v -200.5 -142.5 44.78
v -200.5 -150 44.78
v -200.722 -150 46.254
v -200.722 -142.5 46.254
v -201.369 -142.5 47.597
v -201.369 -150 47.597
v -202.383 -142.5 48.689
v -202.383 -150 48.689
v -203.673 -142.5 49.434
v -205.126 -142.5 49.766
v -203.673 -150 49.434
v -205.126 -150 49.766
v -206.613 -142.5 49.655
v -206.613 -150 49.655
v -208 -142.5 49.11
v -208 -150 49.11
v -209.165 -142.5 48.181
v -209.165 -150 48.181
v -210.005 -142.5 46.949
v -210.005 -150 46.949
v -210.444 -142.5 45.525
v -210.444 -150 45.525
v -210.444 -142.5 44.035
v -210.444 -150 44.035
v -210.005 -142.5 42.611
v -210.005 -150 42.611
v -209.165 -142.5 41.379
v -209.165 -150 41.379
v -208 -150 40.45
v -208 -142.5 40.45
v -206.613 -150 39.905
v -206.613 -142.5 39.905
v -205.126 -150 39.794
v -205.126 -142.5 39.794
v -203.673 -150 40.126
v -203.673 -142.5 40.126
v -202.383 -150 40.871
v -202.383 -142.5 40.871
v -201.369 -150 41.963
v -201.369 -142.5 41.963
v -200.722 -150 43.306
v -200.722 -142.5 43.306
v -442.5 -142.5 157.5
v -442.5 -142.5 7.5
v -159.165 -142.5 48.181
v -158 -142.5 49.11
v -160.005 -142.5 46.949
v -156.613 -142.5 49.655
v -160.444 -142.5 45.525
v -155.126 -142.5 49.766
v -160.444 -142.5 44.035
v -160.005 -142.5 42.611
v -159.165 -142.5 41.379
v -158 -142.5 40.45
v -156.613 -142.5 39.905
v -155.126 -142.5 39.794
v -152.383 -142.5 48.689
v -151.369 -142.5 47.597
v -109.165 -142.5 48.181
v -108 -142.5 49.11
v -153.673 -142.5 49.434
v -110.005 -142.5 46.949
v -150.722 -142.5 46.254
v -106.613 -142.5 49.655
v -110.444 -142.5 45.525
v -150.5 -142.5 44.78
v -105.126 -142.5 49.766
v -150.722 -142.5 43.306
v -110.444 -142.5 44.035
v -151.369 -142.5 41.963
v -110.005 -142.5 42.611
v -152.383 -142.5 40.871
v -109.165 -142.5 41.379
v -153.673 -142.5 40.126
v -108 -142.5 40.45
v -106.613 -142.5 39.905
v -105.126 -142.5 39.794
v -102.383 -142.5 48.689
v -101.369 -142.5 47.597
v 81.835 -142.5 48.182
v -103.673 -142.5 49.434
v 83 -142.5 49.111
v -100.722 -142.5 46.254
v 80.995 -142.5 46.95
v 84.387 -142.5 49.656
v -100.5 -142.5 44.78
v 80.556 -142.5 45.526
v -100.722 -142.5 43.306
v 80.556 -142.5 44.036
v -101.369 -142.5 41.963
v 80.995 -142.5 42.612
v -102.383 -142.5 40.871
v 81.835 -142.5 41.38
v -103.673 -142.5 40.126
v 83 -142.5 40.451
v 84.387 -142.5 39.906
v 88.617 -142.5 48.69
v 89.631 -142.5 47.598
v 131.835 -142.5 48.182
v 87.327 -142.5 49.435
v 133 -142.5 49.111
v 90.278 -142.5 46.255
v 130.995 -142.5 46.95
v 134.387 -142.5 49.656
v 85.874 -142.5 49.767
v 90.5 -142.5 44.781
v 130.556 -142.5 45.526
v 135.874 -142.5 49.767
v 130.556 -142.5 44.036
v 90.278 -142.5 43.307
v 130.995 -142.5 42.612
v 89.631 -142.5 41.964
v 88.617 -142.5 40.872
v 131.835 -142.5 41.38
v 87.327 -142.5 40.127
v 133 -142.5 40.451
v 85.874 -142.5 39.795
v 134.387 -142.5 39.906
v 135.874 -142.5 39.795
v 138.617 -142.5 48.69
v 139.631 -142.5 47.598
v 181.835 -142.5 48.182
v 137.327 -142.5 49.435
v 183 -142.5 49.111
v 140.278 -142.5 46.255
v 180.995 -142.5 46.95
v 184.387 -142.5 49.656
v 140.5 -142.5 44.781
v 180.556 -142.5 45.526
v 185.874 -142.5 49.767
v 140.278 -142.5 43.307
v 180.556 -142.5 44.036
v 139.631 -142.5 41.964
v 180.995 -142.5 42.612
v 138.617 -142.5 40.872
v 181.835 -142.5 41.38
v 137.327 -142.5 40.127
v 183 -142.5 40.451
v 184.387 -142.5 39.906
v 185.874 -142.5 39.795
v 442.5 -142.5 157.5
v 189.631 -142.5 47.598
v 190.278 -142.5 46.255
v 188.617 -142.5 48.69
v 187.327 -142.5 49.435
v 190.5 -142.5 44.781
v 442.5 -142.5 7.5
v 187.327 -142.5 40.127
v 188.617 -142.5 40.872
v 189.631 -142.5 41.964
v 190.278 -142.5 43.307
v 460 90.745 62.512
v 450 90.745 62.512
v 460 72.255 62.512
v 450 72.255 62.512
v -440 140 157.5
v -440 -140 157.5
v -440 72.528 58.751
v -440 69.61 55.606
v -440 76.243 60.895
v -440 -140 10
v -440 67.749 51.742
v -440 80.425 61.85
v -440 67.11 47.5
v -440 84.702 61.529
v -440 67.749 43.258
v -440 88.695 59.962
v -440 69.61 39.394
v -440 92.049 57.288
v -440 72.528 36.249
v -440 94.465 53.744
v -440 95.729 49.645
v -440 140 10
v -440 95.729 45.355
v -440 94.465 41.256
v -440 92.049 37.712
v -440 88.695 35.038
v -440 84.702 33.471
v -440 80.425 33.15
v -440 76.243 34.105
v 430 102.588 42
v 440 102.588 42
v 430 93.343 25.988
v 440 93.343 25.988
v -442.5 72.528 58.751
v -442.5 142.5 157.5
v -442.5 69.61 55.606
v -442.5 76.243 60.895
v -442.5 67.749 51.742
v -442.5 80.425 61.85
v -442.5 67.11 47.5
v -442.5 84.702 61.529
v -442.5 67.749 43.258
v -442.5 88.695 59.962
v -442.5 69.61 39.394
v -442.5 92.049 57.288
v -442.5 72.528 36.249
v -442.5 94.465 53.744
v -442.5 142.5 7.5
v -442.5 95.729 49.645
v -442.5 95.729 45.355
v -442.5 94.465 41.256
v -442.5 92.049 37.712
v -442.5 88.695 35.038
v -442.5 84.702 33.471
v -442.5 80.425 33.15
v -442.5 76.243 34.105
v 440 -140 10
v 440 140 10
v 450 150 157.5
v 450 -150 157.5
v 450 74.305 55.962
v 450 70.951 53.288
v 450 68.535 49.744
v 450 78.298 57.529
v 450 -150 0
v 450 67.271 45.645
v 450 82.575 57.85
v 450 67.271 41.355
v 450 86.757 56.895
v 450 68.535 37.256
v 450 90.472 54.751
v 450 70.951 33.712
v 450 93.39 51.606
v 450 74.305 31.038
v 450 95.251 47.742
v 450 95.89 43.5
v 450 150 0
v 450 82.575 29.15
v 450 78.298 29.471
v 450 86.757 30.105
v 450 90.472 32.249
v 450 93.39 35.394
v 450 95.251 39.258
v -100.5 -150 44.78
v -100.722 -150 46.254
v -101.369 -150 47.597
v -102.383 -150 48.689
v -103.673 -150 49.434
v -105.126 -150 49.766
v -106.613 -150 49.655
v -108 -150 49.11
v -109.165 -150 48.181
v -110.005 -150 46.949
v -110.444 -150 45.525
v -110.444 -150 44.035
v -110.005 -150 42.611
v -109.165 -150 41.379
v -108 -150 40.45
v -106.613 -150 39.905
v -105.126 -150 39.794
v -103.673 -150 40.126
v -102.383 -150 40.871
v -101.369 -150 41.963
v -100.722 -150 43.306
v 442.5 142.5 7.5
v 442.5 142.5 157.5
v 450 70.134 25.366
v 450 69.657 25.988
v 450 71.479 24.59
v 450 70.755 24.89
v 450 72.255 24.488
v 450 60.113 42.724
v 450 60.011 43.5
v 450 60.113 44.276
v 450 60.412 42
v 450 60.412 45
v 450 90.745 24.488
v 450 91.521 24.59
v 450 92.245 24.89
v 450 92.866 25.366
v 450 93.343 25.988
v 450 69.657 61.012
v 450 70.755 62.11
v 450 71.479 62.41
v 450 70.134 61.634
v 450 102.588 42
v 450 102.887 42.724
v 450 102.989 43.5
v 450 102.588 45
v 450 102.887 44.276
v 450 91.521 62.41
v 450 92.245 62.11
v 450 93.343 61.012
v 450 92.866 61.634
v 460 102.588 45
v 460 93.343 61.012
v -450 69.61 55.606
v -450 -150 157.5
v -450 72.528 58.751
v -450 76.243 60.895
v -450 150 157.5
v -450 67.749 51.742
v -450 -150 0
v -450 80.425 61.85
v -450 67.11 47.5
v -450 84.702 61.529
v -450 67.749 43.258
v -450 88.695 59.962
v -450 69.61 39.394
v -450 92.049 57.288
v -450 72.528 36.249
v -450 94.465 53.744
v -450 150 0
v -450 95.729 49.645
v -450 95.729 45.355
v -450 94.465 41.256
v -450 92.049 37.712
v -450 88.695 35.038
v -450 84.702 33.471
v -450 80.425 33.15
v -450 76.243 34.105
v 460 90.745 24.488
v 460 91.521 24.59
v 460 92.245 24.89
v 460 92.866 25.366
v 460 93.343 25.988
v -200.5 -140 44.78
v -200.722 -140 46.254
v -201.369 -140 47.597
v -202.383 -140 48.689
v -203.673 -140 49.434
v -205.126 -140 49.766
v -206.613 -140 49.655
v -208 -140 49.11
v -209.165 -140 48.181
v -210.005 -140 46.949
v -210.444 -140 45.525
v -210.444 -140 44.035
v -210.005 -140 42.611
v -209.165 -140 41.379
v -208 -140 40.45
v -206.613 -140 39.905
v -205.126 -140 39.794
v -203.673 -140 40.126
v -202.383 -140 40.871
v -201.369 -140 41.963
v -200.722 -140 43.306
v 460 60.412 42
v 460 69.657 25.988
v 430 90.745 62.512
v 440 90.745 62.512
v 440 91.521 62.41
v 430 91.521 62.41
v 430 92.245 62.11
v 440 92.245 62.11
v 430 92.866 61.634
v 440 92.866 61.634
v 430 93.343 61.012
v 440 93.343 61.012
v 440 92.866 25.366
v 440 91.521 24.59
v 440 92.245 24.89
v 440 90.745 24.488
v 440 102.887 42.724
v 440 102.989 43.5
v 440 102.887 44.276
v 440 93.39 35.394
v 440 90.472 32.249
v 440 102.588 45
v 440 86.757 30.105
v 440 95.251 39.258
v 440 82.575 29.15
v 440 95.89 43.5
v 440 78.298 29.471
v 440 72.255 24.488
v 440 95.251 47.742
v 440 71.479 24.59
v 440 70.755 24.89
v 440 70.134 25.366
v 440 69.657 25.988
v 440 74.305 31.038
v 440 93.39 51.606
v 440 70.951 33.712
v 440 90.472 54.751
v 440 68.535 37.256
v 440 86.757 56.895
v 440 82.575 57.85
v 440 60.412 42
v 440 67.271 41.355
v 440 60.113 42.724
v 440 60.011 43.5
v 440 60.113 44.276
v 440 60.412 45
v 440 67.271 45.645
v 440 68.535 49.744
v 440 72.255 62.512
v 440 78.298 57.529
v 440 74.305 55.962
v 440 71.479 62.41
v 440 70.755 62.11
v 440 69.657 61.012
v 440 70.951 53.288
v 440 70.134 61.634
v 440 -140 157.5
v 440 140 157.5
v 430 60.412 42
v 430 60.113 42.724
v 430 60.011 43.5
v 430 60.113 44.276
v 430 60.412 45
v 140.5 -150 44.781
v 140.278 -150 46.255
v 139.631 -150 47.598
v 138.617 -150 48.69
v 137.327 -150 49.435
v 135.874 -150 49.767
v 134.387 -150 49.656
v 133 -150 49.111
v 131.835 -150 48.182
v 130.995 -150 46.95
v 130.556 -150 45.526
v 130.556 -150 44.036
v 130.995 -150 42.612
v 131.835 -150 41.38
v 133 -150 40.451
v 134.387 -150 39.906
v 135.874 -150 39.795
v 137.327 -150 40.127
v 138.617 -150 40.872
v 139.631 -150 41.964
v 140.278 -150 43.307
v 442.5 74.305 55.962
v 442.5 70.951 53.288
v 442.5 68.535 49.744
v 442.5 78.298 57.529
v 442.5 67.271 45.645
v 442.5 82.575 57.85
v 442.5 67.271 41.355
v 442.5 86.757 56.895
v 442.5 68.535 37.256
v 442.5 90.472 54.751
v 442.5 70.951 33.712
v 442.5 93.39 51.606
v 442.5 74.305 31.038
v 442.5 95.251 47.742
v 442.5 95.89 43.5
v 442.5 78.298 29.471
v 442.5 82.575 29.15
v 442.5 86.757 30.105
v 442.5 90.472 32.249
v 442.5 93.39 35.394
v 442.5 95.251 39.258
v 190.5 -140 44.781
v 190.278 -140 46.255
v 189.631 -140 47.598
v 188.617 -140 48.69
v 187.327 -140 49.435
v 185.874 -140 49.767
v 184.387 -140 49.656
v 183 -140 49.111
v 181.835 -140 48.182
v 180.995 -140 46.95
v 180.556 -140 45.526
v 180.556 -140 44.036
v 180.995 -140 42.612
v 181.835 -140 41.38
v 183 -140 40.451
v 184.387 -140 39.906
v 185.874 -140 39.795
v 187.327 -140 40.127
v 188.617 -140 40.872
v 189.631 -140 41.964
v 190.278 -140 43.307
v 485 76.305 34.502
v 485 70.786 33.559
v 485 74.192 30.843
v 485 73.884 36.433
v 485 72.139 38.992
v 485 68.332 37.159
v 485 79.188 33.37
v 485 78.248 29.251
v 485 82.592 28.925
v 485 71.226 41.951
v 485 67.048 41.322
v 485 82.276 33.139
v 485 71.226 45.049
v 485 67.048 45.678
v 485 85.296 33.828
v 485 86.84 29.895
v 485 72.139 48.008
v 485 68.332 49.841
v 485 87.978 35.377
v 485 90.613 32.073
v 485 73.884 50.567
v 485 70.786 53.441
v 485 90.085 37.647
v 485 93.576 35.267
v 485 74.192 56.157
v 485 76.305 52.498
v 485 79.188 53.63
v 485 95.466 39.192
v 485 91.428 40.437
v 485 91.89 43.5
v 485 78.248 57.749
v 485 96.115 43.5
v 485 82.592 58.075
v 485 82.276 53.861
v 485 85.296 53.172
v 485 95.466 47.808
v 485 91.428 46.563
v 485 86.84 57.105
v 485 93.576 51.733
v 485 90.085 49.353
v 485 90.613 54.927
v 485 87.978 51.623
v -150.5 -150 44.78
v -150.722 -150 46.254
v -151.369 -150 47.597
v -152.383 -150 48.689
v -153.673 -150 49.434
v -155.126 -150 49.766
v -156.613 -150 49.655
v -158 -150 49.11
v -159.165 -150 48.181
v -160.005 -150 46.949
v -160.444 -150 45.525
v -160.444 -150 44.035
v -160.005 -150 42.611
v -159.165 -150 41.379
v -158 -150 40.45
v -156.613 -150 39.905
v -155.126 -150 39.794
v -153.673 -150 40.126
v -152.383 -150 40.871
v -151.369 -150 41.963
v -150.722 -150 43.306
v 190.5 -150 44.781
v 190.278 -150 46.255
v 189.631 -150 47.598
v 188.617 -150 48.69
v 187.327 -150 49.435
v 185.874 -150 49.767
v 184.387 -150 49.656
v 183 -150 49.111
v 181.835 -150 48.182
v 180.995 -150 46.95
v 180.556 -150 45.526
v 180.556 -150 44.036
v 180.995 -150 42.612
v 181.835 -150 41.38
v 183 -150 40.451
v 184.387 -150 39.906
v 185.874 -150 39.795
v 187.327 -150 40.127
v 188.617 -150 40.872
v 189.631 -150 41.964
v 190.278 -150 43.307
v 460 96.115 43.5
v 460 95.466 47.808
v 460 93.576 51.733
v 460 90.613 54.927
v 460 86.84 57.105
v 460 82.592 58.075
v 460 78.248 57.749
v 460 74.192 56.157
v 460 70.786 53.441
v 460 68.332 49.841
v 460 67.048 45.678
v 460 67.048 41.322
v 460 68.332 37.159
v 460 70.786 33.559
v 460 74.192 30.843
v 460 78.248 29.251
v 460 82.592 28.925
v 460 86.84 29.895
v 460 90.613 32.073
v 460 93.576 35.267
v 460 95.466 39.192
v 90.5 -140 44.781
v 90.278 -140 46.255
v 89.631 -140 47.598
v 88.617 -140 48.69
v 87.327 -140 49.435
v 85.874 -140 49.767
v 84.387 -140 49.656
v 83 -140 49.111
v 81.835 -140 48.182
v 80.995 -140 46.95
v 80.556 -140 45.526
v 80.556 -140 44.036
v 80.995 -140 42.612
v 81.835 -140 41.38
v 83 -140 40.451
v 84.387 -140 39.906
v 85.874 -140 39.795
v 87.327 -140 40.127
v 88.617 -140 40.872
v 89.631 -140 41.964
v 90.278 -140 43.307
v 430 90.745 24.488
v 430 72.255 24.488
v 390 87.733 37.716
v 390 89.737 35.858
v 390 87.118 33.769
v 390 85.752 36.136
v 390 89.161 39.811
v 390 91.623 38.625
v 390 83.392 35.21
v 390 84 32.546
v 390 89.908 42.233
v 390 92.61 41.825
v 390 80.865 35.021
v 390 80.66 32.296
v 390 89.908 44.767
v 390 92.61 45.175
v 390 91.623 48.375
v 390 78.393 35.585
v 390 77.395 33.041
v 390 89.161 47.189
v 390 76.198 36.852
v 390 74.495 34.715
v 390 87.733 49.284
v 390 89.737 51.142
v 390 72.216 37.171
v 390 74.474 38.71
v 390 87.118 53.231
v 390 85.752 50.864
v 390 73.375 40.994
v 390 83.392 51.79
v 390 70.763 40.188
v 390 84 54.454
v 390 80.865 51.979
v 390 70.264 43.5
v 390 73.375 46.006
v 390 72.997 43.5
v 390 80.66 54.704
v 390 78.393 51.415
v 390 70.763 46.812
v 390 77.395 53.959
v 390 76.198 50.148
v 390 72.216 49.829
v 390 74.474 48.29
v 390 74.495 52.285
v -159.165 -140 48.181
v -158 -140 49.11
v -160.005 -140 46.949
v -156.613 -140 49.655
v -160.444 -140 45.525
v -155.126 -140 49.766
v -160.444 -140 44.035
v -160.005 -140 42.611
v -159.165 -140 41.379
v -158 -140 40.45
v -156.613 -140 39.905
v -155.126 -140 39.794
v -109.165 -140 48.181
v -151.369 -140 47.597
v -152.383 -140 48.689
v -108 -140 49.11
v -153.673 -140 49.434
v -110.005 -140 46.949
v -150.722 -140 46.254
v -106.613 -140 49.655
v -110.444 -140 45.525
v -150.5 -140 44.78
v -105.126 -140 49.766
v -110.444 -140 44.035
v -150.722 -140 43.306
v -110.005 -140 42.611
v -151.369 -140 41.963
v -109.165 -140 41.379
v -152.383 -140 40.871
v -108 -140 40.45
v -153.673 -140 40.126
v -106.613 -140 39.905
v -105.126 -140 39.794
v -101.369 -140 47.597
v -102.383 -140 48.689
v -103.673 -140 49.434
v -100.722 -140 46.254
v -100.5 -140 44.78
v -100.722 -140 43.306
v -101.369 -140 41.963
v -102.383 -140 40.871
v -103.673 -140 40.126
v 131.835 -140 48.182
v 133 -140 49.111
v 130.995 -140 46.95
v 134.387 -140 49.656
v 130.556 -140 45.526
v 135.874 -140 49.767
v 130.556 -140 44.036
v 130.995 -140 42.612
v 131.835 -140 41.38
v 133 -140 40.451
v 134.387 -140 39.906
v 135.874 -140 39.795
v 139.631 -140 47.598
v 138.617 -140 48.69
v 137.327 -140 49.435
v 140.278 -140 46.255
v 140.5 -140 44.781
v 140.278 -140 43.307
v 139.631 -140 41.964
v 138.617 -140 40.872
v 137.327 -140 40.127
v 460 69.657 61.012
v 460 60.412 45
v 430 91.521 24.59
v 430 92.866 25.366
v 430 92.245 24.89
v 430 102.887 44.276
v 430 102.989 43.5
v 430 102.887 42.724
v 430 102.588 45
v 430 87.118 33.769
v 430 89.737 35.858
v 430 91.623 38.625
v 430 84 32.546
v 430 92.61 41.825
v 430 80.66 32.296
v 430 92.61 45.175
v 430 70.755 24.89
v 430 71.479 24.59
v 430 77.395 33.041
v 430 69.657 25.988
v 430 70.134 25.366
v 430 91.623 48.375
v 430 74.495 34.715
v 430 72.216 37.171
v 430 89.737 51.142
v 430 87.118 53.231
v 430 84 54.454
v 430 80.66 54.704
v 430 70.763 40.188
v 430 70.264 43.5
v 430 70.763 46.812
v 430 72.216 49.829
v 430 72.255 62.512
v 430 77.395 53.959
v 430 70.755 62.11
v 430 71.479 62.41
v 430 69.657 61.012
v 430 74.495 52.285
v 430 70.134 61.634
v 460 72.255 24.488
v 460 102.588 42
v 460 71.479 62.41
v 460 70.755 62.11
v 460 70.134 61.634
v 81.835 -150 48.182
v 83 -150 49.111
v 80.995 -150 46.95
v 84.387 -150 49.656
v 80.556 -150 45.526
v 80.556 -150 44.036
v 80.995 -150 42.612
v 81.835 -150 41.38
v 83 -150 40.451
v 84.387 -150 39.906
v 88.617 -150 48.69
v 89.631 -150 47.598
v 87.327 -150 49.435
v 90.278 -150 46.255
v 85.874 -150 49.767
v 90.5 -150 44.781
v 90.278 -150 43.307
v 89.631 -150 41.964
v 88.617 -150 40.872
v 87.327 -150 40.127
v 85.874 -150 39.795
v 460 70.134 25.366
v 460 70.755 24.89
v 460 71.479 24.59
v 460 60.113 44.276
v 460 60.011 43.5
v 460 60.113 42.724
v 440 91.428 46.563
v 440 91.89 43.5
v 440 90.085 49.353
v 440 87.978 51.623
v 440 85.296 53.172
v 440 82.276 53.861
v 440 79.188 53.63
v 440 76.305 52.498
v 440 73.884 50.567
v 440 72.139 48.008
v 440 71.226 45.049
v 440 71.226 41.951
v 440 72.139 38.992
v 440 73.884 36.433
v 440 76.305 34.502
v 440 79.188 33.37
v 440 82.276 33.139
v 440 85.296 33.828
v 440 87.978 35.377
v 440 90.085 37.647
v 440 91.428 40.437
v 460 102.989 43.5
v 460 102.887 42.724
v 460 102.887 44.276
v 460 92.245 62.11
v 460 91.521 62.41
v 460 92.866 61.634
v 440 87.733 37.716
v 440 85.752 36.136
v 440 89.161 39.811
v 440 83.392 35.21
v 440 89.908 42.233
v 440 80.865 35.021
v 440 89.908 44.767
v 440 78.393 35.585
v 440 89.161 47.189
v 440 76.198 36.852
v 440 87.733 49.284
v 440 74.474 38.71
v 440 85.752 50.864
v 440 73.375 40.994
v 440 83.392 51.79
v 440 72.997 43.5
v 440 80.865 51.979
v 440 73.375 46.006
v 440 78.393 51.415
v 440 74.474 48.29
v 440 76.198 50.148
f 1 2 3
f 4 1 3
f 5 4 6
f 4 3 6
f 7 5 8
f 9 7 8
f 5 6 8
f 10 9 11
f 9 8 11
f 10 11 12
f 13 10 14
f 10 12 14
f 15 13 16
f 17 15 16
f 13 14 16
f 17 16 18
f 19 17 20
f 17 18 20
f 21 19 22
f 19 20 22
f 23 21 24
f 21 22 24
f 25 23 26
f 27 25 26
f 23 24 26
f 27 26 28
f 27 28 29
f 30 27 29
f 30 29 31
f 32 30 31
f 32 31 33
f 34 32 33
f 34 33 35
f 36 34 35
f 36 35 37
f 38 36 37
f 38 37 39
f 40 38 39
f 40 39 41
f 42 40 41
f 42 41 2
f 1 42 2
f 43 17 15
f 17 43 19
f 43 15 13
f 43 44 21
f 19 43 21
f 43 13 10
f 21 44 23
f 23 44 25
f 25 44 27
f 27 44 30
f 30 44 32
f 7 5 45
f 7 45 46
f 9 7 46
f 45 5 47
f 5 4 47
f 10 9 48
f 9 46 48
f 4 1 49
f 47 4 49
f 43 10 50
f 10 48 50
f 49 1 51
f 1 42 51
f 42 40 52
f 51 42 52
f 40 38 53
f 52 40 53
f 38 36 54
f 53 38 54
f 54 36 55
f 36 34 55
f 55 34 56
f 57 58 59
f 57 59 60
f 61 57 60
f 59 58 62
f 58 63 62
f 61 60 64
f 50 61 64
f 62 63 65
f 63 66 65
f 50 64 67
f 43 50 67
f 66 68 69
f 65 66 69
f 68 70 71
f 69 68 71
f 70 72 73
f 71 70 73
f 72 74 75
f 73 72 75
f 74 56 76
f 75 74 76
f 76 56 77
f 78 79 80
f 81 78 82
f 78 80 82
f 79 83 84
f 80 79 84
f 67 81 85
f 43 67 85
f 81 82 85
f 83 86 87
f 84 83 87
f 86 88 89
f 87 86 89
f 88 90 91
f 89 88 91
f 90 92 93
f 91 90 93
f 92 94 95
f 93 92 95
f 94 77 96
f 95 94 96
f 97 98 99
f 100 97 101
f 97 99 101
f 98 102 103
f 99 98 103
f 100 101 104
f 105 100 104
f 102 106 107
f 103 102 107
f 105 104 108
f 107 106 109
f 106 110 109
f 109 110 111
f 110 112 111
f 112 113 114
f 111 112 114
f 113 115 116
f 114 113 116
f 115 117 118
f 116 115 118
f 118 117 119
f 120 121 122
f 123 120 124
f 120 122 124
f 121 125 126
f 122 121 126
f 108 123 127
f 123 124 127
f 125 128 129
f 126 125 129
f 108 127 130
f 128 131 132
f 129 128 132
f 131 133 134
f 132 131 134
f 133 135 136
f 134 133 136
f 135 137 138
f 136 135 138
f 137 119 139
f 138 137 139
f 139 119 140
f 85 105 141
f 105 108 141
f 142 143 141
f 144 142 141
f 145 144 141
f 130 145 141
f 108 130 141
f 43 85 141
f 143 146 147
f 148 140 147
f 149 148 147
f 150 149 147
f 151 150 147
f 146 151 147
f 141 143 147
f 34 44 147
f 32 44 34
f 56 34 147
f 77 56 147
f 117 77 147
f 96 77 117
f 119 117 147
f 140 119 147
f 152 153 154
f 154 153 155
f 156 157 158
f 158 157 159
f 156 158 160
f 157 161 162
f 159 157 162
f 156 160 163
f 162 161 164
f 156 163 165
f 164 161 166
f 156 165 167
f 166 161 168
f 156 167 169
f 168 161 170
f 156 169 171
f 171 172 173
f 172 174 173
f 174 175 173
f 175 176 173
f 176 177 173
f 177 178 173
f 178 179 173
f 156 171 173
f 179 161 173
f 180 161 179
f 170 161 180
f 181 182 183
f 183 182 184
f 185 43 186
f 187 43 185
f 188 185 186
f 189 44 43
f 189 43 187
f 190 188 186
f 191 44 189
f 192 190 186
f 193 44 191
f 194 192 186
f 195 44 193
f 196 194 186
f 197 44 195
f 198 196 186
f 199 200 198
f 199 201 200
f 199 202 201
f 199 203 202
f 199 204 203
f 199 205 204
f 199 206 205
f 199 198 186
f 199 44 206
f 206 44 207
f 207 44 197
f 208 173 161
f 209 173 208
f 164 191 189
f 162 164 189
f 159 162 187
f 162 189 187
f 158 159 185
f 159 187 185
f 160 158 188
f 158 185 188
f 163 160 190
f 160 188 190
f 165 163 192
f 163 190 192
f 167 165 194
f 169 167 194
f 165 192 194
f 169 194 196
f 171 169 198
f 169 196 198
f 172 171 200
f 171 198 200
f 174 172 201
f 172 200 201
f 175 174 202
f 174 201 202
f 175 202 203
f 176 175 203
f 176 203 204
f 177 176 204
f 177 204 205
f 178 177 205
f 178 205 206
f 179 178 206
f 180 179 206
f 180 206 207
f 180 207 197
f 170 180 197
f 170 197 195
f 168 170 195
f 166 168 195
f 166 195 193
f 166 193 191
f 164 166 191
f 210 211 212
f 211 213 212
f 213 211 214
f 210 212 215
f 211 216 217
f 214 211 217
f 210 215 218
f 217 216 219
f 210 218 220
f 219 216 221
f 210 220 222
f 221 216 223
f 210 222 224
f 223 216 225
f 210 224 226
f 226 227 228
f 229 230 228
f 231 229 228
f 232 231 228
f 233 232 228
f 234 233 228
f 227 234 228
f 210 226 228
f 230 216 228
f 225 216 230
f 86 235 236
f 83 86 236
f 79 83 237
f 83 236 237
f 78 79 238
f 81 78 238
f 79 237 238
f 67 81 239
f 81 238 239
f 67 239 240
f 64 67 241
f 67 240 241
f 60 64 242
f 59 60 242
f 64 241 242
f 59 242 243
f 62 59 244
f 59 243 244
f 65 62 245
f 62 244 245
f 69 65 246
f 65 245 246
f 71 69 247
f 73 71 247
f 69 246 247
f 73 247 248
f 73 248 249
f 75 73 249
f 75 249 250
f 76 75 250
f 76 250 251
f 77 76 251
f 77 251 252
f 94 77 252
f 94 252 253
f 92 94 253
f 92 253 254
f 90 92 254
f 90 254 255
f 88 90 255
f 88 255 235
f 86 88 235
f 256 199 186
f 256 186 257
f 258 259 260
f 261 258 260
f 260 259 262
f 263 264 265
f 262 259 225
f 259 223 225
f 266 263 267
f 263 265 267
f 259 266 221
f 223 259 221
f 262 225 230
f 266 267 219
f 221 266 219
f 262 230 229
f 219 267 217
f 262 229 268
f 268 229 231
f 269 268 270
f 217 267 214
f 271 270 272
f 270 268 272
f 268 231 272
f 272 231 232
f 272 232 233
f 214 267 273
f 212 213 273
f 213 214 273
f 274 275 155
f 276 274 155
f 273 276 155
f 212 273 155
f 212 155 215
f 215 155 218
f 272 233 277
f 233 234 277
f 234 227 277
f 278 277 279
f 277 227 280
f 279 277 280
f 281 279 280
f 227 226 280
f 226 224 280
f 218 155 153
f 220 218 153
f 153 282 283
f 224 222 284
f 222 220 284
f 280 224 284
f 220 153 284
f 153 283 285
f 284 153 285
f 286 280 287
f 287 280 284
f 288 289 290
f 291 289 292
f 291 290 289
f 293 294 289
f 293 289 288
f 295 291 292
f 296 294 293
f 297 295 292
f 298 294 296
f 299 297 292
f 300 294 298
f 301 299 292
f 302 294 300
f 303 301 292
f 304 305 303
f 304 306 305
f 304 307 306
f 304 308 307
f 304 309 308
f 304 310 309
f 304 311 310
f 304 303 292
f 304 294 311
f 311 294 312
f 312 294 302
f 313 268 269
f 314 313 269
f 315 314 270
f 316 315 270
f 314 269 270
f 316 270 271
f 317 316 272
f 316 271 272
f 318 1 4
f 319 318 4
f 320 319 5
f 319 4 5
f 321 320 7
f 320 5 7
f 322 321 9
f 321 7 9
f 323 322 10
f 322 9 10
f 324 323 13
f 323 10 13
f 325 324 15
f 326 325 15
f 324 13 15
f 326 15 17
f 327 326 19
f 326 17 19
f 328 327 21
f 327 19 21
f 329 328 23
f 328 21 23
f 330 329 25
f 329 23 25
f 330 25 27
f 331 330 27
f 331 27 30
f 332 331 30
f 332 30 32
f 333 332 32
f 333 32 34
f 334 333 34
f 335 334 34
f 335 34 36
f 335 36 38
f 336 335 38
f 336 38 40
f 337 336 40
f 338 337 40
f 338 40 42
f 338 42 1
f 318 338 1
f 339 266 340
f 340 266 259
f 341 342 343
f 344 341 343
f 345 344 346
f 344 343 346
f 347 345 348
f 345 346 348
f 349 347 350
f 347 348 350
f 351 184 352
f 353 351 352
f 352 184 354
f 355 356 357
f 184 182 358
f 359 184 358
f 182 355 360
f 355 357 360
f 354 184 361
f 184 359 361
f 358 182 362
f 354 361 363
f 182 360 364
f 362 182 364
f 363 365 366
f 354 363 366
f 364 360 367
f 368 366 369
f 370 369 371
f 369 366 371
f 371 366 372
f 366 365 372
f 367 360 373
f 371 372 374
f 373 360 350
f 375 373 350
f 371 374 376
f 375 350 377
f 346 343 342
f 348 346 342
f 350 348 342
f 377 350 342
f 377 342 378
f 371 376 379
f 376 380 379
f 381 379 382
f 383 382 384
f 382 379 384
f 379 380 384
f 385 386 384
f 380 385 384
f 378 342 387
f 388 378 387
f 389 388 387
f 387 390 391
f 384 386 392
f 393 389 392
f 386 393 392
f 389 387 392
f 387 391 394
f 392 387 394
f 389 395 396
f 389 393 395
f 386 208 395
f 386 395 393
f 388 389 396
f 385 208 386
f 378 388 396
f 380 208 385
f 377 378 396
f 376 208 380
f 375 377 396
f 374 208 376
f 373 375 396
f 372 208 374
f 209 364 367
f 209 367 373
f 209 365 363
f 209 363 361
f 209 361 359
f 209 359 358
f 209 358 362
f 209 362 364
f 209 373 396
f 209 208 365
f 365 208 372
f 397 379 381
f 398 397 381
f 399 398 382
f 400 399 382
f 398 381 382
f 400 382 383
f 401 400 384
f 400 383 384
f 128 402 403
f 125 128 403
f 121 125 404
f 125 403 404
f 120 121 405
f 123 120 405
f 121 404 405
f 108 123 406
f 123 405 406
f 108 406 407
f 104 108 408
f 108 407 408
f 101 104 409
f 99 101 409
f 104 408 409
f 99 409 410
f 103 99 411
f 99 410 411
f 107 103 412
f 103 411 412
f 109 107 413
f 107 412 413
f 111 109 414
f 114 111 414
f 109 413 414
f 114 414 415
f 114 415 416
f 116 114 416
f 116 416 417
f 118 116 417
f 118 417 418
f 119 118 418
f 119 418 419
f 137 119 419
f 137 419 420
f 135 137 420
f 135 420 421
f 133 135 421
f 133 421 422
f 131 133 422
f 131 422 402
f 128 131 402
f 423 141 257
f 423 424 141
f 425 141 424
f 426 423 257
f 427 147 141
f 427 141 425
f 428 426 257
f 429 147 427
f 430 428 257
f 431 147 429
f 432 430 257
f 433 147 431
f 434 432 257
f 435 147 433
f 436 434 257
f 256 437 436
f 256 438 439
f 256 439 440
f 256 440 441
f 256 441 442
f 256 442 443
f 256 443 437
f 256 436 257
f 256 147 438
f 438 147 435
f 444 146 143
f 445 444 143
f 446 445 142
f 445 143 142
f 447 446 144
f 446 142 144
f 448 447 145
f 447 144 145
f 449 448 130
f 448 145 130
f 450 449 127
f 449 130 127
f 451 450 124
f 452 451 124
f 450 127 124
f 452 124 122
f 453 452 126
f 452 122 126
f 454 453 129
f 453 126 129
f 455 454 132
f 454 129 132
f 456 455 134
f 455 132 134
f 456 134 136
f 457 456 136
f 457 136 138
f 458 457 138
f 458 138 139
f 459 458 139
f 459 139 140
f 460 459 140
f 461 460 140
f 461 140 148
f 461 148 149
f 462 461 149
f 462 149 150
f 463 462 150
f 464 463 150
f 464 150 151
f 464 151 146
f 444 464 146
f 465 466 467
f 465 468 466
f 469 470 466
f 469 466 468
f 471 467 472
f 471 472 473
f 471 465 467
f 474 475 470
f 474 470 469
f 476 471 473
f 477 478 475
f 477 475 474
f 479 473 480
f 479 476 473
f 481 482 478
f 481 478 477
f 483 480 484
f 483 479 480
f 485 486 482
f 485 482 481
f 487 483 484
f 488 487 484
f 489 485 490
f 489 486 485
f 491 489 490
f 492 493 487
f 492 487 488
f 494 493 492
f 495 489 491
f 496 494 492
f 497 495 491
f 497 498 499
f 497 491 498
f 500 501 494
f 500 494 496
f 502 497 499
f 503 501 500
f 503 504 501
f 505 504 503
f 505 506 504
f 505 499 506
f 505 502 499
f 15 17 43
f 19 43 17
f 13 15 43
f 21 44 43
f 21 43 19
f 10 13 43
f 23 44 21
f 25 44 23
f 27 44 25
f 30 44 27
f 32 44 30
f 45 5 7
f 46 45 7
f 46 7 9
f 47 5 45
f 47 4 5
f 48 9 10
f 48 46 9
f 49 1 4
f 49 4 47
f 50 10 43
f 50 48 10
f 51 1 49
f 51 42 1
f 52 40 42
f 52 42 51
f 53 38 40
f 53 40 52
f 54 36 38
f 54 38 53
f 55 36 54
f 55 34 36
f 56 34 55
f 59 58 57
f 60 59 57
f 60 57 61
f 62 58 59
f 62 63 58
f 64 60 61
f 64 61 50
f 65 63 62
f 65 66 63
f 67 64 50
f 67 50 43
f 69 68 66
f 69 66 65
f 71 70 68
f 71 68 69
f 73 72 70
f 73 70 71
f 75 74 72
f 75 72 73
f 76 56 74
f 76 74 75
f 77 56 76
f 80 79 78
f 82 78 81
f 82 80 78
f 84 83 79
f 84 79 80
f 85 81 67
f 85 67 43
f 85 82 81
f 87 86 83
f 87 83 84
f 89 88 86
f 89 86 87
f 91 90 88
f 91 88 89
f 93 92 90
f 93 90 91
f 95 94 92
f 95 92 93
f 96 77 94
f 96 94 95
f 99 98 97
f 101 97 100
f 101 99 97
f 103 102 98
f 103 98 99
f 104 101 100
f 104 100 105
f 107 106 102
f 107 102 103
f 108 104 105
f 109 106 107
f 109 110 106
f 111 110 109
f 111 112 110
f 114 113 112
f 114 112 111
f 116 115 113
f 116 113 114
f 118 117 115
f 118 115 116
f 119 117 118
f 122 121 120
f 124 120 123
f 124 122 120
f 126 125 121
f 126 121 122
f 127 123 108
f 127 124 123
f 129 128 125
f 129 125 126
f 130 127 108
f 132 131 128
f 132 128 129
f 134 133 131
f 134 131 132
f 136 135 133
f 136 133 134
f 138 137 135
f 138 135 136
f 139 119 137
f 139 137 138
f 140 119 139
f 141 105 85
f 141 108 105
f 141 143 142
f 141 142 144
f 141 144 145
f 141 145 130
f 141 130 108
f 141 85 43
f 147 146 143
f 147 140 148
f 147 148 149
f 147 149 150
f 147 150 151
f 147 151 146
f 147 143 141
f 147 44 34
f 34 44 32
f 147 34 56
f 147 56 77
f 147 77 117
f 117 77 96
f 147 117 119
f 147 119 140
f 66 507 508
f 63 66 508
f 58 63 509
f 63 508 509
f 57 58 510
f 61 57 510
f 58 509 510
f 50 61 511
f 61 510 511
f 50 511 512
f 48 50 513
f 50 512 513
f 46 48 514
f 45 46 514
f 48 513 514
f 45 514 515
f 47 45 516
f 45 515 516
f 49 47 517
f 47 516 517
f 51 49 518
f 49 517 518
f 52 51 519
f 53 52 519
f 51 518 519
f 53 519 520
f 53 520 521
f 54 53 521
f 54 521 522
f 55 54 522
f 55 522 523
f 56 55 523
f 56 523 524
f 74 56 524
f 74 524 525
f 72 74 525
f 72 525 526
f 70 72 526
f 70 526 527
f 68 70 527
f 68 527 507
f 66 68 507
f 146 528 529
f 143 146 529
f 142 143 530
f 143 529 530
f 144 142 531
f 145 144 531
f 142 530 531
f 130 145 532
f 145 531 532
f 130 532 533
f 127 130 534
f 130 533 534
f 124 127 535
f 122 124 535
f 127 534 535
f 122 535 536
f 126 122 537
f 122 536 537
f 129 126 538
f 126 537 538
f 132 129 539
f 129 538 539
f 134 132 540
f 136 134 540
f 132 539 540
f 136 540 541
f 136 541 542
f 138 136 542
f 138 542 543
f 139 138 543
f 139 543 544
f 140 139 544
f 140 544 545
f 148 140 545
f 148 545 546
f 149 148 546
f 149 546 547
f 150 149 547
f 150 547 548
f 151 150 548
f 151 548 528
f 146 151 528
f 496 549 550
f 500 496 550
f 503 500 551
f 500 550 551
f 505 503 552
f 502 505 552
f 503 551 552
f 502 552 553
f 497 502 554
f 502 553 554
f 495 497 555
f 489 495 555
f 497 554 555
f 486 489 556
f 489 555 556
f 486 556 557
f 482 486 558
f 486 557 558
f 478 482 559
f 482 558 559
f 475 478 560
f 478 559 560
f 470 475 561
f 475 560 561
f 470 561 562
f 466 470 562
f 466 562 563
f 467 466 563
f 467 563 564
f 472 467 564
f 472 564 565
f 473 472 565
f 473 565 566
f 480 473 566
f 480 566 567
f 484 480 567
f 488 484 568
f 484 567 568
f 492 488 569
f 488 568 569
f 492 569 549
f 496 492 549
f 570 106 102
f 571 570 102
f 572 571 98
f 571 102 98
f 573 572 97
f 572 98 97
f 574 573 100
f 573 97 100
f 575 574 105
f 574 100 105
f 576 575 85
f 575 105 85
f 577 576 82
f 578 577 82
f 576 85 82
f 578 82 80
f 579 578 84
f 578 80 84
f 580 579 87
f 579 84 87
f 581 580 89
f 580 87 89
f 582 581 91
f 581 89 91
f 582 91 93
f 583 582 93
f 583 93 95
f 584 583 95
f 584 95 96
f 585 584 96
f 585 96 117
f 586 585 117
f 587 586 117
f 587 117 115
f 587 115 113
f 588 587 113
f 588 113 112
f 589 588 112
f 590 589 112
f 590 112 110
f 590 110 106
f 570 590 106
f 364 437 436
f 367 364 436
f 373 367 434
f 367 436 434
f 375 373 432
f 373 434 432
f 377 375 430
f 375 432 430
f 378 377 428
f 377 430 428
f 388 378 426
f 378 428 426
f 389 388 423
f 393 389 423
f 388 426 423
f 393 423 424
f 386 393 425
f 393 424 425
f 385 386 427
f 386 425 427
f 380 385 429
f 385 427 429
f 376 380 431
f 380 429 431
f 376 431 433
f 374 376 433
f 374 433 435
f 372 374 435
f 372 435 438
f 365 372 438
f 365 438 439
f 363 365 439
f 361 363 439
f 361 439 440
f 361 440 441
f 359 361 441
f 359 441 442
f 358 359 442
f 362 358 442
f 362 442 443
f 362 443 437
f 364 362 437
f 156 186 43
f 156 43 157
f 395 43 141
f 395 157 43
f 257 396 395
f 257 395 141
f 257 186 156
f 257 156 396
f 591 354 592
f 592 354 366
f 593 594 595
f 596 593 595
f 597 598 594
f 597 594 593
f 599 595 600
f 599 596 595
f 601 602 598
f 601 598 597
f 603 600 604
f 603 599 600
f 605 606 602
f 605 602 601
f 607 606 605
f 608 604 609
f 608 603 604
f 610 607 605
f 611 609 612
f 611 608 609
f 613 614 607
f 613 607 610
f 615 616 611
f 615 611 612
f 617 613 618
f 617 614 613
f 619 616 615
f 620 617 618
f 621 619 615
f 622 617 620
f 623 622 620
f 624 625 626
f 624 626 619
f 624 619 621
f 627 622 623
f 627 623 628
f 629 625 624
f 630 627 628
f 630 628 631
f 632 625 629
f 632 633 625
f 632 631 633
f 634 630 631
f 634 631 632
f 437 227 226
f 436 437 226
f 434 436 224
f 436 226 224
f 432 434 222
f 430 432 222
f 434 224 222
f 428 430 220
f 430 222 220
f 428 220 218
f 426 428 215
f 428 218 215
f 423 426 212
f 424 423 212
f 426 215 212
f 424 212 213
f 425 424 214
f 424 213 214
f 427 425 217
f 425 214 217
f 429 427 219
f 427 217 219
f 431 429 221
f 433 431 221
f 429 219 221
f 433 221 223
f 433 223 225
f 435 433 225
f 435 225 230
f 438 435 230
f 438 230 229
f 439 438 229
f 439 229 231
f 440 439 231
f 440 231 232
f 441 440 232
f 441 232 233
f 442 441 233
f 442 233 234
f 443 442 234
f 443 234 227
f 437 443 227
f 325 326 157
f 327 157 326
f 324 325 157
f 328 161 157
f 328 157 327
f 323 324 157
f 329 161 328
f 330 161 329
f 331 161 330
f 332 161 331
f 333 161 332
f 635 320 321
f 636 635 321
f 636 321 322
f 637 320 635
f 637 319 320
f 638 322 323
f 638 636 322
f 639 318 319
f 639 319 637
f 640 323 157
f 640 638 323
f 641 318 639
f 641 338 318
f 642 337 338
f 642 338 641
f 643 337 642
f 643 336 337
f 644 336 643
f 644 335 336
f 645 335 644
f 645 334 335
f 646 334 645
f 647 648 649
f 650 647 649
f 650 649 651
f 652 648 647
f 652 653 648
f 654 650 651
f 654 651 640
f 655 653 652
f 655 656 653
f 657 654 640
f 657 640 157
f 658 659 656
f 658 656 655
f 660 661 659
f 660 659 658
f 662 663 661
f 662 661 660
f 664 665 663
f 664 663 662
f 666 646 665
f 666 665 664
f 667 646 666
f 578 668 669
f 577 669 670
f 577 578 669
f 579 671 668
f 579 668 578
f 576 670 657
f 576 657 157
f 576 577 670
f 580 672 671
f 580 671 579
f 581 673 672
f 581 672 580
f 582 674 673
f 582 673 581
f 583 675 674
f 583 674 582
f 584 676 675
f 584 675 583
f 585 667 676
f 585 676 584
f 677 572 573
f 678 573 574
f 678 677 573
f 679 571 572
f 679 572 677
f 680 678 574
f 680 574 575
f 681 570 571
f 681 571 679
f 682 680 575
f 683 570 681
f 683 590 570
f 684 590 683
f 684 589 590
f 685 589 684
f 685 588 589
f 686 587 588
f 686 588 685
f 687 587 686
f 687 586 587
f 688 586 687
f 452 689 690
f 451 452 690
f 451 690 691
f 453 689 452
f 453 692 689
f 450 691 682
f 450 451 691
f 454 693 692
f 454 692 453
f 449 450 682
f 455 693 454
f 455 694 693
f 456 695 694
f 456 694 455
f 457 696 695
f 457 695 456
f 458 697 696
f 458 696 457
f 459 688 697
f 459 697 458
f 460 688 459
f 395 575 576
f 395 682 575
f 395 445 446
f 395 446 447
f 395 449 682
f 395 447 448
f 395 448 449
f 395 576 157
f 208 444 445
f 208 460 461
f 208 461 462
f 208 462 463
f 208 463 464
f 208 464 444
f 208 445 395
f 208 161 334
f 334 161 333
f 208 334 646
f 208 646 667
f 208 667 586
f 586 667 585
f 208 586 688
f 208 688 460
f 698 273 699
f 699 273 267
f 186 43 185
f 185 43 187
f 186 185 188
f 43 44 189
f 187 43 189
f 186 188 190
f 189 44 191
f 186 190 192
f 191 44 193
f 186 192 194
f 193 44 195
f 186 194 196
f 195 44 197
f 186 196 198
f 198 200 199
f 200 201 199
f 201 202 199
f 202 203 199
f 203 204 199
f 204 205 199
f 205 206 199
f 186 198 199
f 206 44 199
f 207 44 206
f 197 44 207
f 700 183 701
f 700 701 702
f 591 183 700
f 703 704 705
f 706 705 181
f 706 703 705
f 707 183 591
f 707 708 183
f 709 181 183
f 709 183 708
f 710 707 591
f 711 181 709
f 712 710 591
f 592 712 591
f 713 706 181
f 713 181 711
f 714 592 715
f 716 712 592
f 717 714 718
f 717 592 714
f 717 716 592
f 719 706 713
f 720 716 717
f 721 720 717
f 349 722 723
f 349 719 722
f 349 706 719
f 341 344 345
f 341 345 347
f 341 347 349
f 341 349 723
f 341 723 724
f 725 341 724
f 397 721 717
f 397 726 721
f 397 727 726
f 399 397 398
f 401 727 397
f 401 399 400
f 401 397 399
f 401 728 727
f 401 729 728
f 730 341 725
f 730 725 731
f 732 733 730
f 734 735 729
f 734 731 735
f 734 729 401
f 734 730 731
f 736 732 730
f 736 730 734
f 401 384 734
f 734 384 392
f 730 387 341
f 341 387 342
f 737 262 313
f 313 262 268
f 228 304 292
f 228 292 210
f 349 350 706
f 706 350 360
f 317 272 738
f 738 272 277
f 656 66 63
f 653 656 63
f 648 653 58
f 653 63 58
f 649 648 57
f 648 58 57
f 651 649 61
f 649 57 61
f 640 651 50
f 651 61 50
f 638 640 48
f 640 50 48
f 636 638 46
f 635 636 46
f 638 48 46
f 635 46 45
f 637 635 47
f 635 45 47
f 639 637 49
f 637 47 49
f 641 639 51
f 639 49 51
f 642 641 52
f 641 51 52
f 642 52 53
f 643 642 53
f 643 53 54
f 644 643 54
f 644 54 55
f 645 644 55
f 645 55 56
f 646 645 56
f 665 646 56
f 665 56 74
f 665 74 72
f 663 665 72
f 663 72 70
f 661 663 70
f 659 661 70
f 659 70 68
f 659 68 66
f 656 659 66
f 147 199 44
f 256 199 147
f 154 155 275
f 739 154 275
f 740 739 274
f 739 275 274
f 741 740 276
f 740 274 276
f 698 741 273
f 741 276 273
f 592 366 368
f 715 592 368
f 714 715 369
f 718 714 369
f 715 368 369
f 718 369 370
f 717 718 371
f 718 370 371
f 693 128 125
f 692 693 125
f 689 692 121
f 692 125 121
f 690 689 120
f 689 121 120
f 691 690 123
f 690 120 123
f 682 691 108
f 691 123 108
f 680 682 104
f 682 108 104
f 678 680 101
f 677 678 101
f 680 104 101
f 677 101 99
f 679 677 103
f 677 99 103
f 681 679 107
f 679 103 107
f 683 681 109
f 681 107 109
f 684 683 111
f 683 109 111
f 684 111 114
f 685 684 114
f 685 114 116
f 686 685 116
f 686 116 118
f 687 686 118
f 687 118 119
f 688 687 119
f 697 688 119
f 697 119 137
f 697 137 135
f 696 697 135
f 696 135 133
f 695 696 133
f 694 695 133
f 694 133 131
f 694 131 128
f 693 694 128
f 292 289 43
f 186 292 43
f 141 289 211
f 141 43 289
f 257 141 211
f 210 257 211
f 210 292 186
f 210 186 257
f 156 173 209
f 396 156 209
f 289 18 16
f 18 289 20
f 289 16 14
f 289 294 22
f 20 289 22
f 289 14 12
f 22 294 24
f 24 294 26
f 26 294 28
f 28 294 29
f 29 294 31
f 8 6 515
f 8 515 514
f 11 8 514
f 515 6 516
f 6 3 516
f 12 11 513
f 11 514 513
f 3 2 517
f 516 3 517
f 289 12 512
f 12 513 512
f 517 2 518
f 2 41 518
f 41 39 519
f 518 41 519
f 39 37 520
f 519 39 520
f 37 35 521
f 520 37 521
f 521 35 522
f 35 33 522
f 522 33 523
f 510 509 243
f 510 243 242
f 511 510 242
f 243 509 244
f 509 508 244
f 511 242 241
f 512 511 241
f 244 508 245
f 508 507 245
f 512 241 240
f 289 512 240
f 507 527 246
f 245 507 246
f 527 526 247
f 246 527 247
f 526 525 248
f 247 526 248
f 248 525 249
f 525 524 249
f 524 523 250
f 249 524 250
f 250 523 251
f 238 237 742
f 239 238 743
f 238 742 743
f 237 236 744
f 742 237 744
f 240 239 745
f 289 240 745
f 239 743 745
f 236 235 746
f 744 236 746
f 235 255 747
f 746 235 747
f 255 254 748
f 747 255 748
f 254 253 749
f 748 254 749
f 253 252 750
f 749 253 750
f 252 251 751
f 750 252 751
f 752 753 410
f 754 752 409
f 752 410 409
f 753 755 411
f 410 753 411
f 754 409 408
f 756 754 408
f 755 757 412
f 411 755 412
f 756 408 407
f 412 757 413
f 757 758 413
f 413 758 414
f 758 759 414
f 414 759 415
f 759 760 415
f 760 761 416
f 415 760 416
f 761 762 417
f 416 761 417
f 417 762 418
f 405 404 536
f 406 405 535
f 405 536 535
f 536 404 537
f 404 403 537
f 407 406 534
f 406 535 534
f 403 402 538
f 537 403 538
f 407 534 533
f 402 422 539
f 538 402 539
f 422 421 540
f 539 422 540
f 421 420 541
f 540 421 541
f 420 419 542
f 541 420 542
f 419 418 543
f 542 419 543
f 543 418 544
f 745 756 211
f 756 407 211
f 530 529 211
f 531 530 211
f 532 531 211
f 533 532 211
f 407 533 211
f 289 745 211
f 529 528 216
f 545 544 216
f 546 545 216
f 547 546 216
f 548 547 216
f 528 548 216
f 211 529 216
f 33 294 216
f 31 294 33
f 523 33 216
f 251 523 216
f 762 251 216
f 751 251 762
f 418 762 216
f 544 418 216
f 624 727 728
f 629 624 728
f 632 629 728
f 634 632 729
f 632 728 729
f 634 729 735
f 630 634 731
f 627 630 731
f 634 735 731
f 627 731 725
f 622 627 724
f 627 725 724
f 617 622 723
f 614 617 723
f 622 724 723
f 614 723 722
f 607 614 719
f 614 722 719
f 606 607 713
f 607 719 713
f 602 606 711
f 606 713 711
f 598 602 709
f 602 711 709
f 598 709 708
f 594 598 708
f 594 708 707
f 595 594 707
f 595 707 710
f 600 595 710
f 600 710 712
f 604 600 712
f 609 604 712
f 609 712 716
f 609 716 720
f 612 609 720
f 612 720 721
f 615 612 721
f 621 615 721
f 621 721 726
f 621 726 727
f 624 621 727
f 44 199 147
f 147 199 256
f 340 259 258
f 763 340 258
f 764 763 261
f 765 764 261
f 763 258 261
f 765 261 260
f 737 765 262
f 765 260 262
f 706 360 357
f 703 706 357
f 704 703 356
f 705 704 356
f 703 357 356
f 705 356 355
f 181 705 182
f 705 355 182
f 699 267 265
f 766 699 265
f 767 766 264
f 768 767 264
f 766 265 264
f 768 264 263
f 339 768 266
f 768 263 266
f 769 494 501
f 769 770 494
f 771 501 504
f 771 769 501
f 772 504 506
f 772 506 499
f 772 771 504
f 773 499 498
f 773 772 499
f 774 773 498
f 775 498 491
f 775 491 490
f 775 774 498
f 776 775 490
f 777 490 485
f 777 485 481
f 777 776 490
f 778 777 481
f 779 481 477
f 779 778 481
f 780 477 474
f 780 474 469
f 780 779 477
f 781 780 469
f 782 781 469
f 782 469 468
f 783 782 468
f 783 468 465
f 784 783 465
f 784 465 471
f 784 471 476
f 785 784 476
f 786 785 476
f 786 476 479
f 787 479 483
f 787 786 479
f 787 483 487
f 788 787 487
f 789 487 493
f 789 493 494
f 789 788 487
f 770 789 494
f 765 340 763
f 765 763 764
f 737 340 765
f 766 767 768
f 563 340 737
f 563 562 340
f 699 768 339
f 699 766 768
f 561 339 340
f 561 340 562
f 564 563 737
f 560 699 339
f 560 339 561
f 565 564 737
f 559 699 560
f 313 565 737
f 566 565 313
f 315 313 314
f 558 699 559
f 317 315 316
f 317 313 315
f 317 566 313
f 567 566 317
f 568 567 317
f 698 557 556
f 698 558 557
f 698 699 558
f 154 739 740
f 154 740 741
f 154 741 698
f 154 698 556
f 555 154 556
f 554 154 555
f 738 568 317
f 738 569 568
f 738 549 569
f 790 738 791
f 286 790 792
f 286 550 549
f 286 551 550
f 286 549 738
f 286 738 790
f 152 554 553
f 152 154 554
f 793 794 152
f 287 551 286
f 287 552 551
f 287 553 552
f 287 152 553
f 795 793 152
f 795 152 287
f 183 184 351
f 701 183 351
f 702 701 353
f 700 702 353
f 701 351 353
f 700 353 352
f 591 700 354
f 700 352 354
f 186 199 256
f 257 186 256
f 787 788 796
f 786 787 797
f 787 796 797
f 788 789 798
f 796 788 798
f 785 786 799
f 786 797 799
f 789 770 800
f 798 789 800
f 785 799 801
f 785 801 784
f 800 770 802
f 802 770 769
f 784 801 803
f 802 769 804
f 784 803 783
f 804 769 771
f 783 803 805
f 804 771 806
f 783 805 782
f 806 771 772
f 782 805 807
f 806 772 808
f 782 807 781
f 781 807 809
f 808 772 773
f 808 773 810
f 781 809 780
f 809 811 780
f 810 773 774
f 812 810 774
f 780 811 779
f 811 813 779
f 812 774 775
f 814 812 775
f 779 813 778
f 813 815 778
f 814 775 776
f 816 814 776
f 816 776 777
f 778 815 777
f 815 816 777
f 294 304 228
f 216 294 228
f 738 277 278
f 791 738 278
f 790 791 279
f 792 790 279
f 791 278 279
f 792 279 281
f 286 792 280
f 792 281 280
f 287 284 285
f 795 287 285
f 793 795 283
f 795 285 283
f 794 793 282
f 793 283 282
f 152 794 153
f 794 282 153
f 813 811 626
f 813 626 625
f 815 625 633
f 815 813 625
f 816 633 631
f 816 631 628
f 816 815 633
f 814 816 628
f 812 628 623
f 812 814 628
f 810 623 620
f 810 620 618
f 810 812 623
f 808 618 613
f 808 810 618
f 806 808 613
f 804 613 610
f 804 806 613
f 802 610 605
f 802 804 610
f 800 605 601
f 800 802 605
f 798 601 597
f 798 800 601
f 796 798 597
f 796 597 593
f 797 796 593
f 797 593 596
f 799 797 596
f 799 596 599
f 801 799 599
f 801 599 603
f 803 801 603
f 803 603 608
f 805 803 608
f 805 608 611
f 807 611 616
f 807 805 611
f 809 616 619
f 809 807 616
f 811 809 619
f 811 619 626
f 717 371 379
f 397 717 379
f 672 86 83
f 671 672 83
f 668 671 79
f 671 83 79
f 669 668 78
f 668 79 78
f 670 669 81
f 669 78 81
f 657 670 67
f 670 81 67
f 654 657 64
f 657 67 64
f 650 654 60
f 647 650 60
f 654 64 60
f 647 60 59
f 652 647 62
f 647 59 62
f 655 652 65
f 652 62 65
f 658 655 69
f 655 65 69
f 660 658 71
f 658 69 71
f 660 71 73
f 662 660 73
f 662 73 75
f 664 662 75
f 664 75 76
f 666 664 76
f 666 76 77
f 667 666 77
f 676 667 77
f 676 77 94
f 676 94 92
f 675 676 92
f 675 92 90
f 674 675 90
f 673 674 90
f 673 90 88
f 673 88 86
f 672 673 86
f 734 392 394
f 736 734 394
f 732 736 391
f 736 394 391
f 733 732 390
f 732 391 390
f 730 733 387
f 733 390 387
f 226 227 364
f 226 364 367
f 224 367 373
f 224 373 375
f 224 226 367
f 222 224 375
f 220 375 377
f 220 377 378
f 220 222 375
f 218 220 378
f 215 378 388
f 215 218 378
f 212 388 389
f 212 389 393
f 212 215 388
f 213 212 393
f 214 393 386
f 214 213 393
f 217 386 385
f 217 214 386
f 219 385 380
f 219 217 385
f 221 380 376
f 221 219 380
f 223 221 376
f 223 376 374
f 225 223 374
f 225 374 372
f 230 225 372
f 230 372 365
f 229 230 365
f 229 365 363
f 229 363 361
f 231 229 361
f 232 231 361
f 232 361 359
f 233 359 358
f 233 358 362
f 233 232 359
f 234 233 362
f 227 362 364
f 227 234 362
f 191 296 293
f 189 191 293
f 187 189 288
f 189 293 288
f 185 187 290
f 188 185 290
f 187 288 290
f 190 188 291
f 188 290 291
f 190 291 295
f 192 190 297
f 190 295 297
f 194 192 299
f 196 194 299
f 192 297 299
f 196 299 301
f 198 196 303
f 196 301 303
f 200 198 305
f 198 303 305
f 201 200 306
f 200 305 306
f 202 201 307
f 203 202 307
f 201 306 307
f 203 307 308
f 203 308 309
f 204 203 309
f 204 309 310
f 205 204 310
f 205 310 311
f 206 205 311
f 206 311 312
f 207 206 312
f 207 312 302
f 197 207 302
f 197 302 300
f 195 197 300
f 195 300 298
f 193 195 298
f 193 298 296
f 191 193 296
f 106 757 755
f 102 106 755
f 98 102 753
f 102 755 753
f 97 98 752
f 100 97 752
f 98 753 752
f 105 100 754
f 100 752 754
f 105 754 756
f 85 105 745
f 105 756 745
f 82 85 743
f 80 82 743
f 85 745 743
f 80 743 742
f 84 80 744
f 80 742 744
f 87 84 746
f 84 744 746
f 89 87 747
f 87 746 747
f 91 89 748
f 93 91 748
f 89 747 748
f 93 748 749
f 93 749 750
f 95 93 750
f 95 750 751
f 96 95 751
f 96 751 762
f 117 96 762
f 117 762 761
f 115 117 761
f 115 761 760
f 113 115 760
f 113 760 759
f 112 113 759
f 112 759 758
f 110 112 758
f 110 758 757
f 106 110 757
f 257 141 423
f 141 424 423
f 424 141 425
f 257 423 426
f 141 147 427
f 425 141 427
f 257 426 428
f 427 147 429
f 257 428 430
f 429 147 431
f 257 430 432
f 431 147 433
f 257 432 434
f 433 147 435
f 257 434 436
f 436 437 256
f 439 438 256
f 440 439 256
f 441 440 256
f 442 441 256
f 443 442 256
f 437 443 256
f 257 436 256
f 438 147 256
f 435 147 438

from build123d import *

# Parameters (mm, degrees)
F0_W      = 900
F0_H      = 300
F1_DEPTH  = 7.5
F2_W      = 900
F2_H      = 300
F2_W_2    = 885
F2_H_2    = 285
F3_DEPTH  = 150
F4_DEPTH  = 2.5
F5_W      = 885
F5_H      = 285
F5_W_2    = 880
F5_H_2    = 280
F6_DEPTH  = 147.5
F7_R      = 5
F8_DEPTH  = 25
F9_R      = 14.39
F10_DEPTH = 500
F11_R     = 14.39
F12_DEPTH = 25
F13_R     = 14.39
F13_R_2   = 10.39
F14_DEPTH = 10
F15_R     = 10.39
F16_DEPTH = 10
F17_R     = 14.6154428136
F17_R_2   = 10.39
F18_DEPTH = 25
F19_R     = 11.2359155228
F19_R_2   = 8.5030368104
F20_DEPTH = 50
F21_R     = 11.2359155228
F22_DEPTH = 10


with BuildPart() as f1:
    # F0 (on Top) → F1 (new body)
    with BuildSketch(Plane.XY):
        Rectangle(F0_W, F0_H)
    extrude(amount=F1_DEPTH)

    # F2 (on face) → F3 (join)
    with BuildSketch(Plane.XY.offset(7.5)):
        Rectangle(F2_W, F2_H)
        Rectangle(F2_W_2, F2_H_2, mode=Mode.SUBTRACT)
    extrude(amount=F3_DEPTH)


with BuildPart() as f4:
    # F4 (new): a face of the model
    f4_faces = [f1.part.faces().sort_by_distance(p)[0] for p in [
        (0, 0, 7.5),
    ]]
    extrude(f4_faces, amount=F4_DEPTH)

    # F5 (on face) → F6 (join)
    with BuildSketch(Plane.XY.offset(10)):
        Rectangle(F5_W, F5_H)
        Rectangle(F5_W_2, F5_H_2, mode=Mode.SUBTRACT)
    extrude(amount=F6_DEPTH)


with BuildPart() as f8_tool:
    # F7 (on face) → F8 (new body)
    with BuildSketch(Plane.XZ.offset(150)):
        with Locations((85.5, 44.781)):
            Circle(F7_R)
        with Locations((135.5, 44.781)):
            Circle(F7_R)
        with Locations((-105.5, 44.78)):
            Circle(F7_R)
        with Locations((-155.5, 44.78)):
            Circle(F7_R)
        with Locations((185.5, 44.781)):
            Circle(F7_R)
        with Locations((-205.5, 44.78)):
            Circle(F7_R)
    extrude(amount=-F8_DEPTH)


with BuildPart() as f1_1:
    add(f1.part)

    # F8: cut by f8_tool
    add(f8_tool.part, mode=Mode.SUBTRACT)


with BuildPart() as f4_1:
    add(f4.part)

    # F8: cut by f8_tool
    add(f8_tool.part, mode=Mode.SUBTRACT)


with BuildPart() as f10_tool:
    # F9 (on face) → F10 (new body)
    with BuildSketch(Plane(origin=(-450, 0, 0), x_dir=(0, -1, 0), z_dir=(-1, 0, 0))):
        with Locations((-81.5, 47.5)):
            Circle(F9_R)
    extrude(amount=-F10_DEPTH)


with BuildPart() as f1_2:
    add(f1_1.part)

    # F10: cut by f10_tool
    add(f10_tool.part, mode=Mode.SUBTRACT)


with BuildPart() as f4_2:
    add(f4_1.part)

    # F10: cut by f10_tool
    add(f10_tool.part, mode=Mode.SUBTRACT)


with BuildPart() as f12_tool:
    # F11 (on face) → F12 (new body)
    with BuildSketch(Plane.YZ.offset(450)):
        with Locations((81.5, 43.5)):
            Circle(F11_R)
    extrude(amount=-F12_DEPTH)


with BuildPart() as f1_3:
    add(f1_2.part)

    # F12: cut by f12_tool
    add(f12_tool.part, mode=Mode.SUBTRACT)


with BuildPart() as f4_3:
    add(f4_2.part)

    # F12: cut by f12_tool
    add(f12_tool.part, mode=Mode.SUBTRACT)


with BuildPart() as f14:
    # F13 (on face) → F14 (new body)
    with BuildSketch(Plane.YZ.offset(450)):
        with Locations((81.5, 43.5)):
            Circle(F13_R)
        with Locations((81.5, 43.5)):
            Circle(F13_R_2, mode=Mode.SUBTRACT)
    extrude(amount=-F14_DEPTH)

    # F15 (on face) → F16 (join)
    with BuildSketch(Plane.YZ.offset(450)):
        with BuildLine():
            Line((90.7447234463, 62.5123307109), (72.2552765537, 62.5123307109))
            ThreePointArc((72.2552765537, 62.5123307109), (70.7552765537, 62.1104069222), (69.6572003424, 61.0123307109))
            Line((69.6572003424, 61.0123307109), (60.4124768961, 45))
            ThreePointArc((60.4124768961, 45), (60.0105531074, 43.5), (60.4124768961, 42))
            Line((60.4124768961, 42), (69.6572003424, 25.9876692891))
            ThreePointArc((69.6572003424, 25.9876692891), (70.7552765537, 24.8895930778), (72.2552765537, 24.4876692891))
            Line((72.2552765537, 24.4876692891), (90.7447234463, 24.4876692891))
            ThreePointArc((90.7447234463, 24.4876692891), (92.2447234463, 24.8895930778), (93.3427996576, 25.9876692891))
            Line((93.3427996576, 25.9876692891), (102.5875231039, 42))
            ThreePointArc((102.5875231039, 42), (102.9894468926, 43.5), (102.5875231039, 45))
            Line((102.5875231039, 45), (93.3427996576, 61.0123307109))
            ThreePointArc((93.3427996576, 61.0123307109), (92.2447234463, 62.1104069222), (90.7447234463, 62.5123307109))
        make_face()
        with Locations((81.5, 43.5)):
            Circle(F15_R, mode=Mode.SUBTRACT)
    extrude(amount=F16_DEPTH)

    # F17 (on face) → F18 (join)
    with BuildSketch(Plane.YZ.offset(460)):
        with Locations((81.5, 43.5)):
            Circle(F17_R)
        with Locations((81.5, 43.5)):
            Circle(F17_R_2, mode=Mode.SUBTRACT)
    extrude(amount=F18_DEPTH)

    # F19 (on face) → F20 (join)
    with BuildSketch(Plane(origin=(440, 0, 0), x_dir=(0, -1, 0), z_dir=(-1, 0, 0))):
        with Locations((-81.5, 43.5)):
            Circle(F19_R)
        with Locations((-81.5, 43.5)):
            Circle(F19_R_2, mode=Mode.SUBTRACT)
    extrude(amount=F20_DEPTH)

    # F21 (on face) → F22 (join)
    with BuildSketch(Plane(origin=(440, 0, 0), x_dir=(0, -1, 0), z_dir=(-1, 0, 0))):
        with BuildLine():
            Line((-72.2552765537, 62.5123307109), (-90.7447234463, 62.5123307109))
            ThreePointArc((-90.7447234463, 62.5123307109), (-92.2447234463, 62.1104069222), (-93.3427996576, 61.0123307109))
            Line((-93.3427996576, 61.0123307109), (-102.5875231039, 45))
            ThreePointArc((-102.5875231039, 45), (-102.9894468926, 43.5), (-102.5875231039, 42))
            Line((-102.5875231039, 42), (-93.3427996576, 25.9876692891))
            ThreePointArc((-93.3427996576, 25.9876692891), (-92.2447234463, 24.8895930778), (-90.7447234463, 24.4876692891))
            Line((-90.7447234463, 24.4876692891), (-72.2552765537, 24.4876692891))
            ThreePointArc((-72.2552765537, 24.4876692891), (-70.7552765537, 24.8895930778), (-69.6572003424, 25.9876692891))
            Line((-69.6572003424, 25.9876692891), (-60.4124768961, 42))
            ThreePointArc((-60.4124768961, 42), (-60.0105531074, 43.5), (-60.4124768961, 45))
            Line((-60.4124768961, 45), (-69.6572003424, 61.0123307109))
            ThreePointArc((-69.6572003424, 61.0123307109), (-70.7552765537, 62.1104069222), (-72.2552765537, 62.5123307109))
        make_face()
        with Locations((-81.5, 43.5)):
            Circle(F21_R, mode=Mode.SUBTRACT)
    extrude(amount=F22_DEPTH)


solid = Compound([f1_3.part, f4_3.part, f14.part])
